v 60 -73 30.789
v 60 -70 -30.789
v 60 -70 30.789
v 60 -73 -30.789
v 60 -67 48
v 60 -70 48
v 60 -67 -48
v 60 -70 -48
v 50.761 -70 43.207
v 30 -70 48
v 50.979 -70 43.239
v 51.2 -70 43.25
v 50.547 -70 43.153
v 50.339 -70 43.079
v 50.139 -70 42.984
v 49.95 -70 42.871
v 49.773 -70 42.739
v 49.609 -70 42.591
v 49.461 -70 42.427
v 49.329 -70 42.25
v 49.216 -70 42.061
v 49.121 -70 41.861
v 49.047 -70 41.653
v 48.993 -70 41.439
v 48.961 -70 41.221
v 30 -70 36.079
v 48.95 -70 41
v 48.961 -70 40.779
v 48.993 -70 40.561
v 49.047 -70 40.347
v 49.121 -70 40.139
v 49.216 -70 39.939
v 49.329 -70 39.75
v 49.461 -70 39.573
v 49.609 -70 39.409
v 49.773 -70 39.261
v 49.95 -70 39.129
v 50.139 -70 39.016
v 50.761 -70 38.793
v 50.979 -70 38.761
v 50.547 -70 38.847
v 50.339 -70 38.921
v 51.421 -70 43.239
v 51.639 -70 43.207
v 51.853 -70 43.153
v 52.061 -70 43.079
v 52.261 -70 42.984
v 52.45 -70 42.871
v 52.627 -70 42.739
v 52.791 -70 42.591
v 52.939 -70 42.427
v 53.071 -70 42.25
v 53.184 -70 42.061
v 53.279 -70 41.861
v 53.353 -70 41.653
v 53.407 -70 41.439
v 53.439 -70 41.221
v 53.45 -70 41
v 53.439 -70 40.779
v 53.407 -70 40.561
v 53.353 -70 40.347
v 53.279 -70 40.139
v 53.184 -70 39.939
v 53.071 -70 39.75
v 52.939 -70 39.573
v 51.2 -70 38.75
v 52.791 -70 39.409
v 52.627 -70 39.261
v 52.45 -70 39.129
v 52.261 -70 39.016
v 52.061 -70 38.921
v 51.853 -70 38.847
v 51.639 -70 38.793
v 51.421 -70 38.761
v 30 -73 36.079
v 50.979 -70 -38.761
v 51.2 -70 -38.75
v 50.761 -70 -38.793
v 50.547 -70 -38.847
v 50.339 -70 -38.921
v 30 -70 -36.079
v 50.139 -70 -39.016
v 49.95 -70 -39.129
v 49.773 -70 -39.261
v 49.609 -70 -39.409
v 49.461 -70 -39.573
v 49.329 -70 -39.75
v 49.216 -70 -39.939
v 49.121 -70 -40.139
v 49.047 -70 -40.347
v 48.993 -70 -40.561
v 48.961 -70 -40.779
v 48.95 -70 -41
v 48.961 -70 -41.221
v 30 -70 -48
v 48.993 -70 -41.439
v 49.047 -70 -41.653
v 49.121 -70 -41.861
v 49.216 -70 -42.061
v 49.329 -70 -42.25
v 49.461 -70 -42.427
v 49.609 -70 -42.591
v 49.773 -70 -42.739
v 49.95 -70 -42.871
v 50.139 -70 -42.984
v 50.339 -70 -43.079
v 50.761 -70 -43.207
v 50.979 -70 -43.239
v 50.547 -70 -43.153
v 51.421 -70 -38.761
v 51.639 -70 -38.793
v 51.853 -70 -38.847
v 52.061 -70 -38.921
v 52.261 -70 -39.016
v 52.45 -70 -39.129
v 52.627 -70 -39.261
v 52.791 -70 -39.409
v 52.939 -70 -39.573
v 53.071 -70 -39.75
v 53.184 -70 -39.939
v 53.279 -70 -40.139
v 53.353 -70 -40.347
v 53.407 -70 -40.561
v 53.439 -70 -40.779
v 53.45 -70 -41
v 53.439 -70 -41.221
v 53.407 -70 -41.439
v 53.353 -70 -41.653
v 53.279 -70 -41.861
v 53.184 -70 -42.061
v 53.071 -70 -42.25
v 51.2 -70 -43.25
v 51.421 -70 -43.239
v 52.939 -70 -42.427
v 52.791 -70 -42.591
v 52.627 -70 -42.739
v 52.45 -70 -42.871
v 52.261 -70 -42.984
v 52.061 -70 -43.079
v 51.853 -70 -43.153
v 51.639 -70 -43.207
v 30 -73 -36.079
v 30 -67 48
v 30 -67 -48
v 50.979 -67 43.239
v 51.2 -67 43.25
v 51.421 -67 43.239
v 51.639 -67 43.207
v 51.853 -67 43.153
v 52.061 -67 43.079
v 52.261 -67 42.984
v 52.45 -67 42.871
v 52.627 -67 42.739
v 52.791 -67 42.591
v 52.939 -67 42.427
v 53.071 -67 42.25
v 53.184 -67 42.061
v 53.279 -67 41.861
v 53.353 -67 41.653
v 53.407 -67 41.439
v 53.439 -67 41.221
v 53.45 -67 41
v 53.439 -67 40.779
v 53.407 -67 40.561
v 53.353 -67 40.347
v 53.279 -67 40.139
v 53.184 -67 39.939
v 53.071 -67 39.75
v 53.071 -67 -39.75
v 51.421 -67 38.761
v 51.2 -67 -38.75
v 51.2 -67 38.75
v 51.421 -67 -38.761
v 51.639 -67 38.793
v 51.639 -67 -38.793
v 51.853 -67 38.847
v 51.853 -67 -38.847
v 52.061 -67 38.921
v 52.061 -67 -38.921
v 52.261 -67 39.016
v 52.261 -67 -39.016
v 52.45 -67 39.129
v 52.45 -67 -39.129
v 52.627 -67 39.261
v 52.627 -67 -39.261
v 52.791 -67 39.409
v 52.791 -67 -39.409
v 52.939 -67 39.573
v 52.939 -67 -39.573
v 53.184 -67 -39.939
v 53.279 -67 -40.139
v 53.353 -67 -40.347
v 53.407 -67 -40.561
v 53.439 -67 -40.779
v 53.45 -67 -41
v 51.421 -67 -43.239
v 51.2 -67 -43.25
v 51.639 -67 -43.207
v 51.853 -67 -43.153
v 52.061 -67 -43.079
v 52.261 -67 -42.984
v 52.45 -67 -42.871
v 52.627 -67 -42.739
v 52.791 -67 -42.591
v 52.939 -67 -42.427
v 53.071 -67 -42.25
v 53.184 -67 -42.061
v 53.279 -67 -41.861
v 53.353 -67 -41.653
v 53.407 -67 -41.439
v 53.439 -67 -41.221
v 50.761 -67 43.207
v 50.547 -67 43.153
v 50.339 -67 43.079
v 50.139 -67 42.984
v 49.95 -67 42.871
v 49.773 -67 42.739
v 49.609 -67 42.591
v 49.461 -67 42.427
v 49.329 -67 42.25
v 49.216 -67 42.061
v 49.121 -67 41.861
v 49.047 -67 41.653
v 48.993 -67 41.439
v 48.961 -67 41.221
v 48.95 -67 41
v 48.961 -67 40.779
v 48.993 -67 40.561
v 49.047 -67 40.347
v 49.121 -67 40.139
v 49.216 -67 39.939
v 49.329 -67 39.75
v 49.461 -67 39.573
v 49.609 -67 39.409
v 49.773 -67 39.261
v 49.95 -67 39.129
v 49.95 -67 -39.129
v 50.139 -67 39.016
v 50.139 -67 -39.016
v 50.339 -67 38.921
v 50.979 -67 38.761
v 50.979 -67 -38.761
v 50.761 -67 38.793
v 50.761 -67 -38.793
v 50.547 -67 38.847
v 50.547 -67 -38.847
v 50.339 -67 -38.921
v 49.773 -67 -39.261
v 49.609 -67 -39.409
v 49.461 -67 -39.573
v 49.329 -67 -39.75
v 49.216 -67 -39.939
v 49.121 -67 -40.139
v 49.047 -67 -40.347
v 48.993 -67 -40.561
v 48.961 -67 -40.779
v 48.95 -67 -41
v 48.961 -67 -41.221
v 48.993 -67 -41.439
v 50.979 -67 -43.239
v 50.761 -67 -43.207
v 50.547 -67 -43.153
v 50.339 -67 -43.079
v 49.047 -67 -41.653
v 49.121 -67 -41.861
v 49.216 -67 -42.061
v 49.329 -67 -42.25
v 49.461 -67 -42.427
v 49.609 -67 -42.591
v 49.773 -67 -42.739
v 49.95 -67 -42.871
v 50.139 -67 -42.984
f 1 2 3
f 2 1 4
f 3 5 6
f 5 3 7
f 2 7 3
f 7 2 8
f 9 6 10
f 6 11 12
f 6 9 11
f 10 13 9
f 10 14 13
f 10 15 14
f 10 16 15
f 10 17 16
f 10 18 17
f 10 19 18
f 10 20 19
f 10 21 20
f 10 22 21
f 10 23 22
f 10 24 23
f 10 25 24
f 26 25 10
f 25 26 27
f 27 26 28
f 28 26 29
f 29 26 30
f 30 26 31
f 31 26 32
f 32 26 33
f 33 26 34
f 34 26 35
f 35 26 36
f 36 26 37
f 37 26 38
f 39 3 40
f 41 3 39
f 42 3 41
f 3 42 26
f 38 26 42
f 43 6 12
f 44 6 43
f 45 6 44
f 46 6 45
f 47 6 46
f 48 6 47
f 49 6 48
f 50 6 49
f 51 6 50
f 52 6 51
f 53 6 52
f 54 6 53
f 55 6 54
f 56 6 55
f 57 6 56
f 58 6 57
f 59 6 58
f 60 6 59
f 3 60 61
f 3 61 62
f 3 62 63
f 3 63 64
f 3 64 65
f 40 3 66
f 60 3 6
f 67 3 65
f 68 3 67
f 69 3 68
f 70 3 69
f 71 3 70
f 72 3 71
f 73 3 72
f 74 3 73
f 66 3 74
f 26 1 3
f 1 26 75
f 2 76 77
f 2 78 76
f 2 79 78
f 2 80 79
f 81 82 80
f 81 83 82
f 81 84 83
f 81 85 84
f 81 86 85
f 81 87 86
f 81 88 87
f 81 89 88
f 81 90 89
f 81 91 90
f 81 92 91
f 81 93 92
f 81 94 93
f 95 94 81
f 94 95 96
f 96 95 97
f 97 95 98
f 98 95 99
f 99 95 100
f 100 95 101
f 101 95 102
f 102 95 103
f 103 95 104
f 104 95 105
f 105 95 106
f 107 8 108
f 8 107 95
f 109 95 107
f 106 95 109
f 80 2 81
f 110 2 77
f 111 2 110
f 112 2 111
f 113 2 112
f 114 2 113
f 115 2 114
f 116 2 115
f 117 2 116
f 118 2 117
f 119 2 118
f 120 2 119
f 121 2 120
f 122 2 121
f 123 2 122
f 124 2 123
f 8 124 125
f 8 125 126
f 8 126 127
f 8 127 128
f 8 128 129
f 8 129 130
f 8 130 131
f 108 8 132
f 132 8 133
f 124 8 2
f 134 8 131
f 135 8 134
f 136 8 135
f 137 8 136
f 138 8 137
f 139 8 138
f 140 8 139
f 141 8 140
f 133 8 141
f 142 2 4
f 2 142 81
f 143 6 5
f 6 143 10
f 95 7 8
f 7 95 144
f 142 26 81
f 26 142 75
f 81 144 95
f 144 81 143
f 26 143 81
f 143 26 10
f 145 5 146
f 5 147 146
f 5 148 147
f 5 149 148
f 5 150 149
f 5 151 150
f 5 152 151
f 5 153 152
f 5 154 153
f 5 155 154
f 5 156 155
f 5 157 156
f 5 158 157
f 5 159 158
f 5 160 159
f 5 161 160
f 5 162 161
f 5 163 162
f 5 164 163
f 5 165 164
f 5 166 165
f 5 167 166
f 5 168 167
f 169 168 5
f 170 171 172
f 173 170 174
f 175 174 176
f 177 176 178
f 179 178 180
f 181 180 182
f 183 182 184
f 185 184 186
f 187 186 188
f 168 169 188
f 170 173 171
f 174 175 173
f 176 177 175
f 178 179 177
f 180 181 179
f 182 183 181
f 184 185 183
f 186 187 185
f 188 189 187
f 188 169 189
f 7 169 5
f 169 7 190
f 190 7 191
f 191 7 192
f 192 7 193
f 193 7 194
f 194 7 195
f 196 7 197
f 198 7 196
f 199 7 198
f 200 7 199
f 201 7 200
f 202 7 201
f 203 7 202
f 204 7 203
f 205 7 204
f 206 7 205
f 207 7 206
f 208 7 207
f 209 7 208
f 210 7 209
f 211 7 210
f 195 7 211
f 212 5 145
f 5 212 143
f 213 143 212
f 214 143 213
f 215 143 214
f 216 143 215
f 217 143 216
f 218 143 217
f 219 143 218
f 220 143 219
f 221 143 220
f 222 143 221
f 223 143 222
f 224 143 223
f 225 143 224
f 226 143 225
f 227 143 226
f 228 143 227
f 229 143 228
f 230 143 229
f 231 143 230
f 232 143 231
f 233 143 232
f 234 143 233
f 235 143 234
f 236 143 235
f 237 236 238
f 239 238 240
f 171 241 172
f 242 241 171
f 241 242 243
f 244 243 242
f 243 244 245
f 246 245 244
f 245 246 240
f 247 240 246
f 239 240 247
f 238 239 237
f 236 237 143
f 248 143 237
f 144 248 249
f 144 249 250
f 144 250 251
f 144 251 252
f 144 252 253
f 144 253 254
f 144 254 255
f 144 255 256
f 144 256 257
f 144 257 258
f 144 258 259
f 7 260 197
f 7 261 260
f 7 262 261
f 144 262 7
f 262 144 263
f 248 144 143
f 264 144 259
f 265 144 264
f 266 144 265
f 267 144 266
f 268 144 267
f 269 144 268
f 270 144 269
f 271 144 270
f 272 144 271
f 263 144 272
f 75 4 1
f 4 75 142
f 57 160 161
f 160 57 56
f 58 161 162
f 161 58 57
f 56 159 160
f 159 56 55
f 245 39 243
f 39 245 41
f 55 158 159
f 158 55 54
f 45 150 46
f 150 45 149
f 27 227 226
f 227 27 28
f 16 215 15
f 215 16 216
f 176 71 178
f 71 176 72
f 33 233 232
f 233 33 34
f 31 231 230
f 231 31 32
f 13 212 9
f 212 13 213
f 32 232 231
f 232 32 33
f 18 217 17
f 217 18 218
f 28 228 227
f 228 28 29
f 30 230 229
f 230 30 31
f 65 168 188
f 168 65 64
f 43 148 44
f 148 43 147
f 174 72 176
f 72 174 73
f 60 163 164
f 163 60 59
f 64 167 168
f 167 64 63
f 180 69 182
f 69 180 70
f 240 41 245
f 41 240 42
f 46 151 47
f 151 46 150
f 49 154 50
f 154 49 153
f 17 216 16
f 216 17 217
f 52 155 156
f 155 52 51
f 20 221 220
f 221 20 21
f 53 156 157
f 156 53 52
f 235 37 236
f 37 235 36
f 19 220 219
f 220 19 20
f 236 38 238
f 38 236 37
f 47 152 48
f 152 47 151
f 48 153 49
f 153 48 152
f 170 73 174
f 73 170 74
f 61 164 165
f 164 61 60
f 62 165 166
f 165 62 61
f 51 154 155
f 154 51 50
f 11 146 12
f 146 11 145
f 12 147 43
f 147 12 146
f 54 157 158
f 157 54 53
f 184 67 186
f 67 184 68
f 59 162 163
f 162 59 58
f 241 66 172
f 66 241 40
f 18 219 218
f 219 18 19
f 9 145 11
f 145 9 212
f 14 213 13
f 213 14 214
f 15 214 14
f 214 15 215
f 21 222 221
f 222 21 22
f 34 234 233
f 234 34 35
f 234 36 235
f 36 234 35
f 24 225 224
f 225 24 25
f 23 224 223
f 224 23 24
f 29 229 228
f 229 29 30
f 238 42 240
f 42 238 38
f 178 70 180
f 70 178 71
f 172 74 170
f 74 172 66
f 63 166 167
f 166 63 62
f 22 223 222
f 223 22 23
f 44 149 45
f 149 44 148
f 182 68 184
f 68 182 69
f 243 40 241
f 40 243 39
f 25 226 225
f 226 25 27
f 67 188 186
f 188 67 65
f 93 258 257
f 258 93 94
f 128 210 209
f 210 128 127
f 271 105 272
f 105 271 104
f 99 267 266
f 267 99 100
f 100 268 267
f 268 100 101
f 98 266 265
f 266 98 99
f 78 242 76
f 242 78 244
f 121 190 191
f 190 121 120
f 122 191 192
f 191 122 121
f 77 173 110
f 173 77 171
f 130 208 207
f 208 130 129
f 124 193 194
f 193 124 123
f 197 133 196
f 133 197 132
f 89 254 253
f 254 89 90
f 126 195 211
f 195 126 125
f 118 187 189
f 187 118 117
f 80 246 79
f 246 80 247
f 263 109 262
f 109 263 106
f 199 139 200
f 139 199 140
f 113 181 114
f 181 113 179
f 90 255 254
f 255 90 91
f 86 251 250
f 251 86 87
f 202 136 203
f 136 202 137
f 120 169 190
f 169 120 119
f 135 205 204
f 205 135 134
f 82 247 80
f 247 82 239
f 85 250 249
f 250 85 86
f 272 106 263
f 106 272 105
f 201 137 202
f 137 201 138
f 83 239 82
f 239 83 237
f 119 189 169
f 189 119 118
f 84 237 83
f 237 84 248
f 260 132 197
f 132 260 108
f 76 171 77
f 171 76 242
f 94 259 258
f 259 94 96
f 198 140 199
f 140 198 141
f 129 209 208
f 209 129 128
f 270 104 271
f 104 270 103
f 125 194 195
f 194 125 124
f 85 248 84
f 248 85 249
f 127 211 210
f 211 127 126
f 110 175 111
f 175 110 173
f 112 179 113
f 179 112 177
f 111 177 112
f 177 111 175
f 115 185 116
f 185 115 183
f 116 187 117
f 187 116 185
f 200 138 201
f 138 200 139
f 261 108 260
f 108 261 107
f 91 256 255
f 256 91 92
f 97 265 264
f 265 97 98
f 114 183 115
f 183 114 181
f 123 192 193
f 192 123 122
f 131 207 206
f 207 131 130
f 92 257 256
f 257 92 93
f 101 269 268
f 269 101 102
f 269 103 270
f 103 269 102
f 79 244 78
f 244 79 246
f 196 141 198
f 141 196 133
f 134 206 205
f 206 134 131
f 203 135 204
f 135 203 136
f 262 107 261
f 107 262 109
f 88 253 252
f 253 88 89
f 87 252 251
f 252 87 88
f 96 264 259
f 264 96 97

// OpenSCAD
$fn=64;
t=3.5;
h=200;
r=70;

ba=10;
difference() {
translate([30,-r-3,-96/2]) cube([30,6,96]);
translate([0,0,50]) armHook();
mirror([0,0,1]) translate([0,0,50]) armHook();
translate([51.2,0,41]) rotate([90,0,0]) cylinder(r=2.25,h=200);
mirror([0,0,1]) translate([51.2,0,41]) rotate([90,0,0]) cylinder(r=2.25,h=200);
}



// intersection() {
// armHook();
// translate([0,0,-4]) cylinder(r=1000,h=1000);
// }

module arch() {
  difference() {
    cylinder(r=r+t,h=h);
    translate([0,0,-1]) cylinder(r=r,h=h+2);
    translate([0,-(r+t+1),-1]) cube([r+t+1,(r+t+1)*2,h+2]);
    rotate([0,0,ba]) translate([0,-(r+t+1),-1]) cube([r+t+1,(r+t+1)*2,h+2]);
  }

  rotate([0,0,ba]) translate([0,r,0]) cube([100,t,h]);
  mirror([0,1,0]) translate([0,r,0]) cube([60,t,h]);


}

module armHook() {
  cw=17;
  difference() {
    intersection() {
      translate([0,0,-100]) arch();
       rotate([0,10,0]) translate([-1000,-1000,-cw/2]) cube([2000,2000,cw]);
    }
    rotate([0,10,0]) translate([52,0,0]) rotate([90,0,0]) cylinder(r=2.2,h=100);
    translate([0,0,2.4]) rotate([0,0,ba]) {
      pinHole(30);
      pinHole(80);
    }
  }
  // rotate([0,0,ba]) {
  // pinHole(30);
  //   pinHole(80);
  // }
}
  
module pinHole(x) {
  translate([x+10,71.75,-50]) cylinder(r=0.75,h=100);
  rotate([0,10,0]) translate([x,57.5,0]) rotate([0,90,0]) cylinder(r=15,h=20);
}
